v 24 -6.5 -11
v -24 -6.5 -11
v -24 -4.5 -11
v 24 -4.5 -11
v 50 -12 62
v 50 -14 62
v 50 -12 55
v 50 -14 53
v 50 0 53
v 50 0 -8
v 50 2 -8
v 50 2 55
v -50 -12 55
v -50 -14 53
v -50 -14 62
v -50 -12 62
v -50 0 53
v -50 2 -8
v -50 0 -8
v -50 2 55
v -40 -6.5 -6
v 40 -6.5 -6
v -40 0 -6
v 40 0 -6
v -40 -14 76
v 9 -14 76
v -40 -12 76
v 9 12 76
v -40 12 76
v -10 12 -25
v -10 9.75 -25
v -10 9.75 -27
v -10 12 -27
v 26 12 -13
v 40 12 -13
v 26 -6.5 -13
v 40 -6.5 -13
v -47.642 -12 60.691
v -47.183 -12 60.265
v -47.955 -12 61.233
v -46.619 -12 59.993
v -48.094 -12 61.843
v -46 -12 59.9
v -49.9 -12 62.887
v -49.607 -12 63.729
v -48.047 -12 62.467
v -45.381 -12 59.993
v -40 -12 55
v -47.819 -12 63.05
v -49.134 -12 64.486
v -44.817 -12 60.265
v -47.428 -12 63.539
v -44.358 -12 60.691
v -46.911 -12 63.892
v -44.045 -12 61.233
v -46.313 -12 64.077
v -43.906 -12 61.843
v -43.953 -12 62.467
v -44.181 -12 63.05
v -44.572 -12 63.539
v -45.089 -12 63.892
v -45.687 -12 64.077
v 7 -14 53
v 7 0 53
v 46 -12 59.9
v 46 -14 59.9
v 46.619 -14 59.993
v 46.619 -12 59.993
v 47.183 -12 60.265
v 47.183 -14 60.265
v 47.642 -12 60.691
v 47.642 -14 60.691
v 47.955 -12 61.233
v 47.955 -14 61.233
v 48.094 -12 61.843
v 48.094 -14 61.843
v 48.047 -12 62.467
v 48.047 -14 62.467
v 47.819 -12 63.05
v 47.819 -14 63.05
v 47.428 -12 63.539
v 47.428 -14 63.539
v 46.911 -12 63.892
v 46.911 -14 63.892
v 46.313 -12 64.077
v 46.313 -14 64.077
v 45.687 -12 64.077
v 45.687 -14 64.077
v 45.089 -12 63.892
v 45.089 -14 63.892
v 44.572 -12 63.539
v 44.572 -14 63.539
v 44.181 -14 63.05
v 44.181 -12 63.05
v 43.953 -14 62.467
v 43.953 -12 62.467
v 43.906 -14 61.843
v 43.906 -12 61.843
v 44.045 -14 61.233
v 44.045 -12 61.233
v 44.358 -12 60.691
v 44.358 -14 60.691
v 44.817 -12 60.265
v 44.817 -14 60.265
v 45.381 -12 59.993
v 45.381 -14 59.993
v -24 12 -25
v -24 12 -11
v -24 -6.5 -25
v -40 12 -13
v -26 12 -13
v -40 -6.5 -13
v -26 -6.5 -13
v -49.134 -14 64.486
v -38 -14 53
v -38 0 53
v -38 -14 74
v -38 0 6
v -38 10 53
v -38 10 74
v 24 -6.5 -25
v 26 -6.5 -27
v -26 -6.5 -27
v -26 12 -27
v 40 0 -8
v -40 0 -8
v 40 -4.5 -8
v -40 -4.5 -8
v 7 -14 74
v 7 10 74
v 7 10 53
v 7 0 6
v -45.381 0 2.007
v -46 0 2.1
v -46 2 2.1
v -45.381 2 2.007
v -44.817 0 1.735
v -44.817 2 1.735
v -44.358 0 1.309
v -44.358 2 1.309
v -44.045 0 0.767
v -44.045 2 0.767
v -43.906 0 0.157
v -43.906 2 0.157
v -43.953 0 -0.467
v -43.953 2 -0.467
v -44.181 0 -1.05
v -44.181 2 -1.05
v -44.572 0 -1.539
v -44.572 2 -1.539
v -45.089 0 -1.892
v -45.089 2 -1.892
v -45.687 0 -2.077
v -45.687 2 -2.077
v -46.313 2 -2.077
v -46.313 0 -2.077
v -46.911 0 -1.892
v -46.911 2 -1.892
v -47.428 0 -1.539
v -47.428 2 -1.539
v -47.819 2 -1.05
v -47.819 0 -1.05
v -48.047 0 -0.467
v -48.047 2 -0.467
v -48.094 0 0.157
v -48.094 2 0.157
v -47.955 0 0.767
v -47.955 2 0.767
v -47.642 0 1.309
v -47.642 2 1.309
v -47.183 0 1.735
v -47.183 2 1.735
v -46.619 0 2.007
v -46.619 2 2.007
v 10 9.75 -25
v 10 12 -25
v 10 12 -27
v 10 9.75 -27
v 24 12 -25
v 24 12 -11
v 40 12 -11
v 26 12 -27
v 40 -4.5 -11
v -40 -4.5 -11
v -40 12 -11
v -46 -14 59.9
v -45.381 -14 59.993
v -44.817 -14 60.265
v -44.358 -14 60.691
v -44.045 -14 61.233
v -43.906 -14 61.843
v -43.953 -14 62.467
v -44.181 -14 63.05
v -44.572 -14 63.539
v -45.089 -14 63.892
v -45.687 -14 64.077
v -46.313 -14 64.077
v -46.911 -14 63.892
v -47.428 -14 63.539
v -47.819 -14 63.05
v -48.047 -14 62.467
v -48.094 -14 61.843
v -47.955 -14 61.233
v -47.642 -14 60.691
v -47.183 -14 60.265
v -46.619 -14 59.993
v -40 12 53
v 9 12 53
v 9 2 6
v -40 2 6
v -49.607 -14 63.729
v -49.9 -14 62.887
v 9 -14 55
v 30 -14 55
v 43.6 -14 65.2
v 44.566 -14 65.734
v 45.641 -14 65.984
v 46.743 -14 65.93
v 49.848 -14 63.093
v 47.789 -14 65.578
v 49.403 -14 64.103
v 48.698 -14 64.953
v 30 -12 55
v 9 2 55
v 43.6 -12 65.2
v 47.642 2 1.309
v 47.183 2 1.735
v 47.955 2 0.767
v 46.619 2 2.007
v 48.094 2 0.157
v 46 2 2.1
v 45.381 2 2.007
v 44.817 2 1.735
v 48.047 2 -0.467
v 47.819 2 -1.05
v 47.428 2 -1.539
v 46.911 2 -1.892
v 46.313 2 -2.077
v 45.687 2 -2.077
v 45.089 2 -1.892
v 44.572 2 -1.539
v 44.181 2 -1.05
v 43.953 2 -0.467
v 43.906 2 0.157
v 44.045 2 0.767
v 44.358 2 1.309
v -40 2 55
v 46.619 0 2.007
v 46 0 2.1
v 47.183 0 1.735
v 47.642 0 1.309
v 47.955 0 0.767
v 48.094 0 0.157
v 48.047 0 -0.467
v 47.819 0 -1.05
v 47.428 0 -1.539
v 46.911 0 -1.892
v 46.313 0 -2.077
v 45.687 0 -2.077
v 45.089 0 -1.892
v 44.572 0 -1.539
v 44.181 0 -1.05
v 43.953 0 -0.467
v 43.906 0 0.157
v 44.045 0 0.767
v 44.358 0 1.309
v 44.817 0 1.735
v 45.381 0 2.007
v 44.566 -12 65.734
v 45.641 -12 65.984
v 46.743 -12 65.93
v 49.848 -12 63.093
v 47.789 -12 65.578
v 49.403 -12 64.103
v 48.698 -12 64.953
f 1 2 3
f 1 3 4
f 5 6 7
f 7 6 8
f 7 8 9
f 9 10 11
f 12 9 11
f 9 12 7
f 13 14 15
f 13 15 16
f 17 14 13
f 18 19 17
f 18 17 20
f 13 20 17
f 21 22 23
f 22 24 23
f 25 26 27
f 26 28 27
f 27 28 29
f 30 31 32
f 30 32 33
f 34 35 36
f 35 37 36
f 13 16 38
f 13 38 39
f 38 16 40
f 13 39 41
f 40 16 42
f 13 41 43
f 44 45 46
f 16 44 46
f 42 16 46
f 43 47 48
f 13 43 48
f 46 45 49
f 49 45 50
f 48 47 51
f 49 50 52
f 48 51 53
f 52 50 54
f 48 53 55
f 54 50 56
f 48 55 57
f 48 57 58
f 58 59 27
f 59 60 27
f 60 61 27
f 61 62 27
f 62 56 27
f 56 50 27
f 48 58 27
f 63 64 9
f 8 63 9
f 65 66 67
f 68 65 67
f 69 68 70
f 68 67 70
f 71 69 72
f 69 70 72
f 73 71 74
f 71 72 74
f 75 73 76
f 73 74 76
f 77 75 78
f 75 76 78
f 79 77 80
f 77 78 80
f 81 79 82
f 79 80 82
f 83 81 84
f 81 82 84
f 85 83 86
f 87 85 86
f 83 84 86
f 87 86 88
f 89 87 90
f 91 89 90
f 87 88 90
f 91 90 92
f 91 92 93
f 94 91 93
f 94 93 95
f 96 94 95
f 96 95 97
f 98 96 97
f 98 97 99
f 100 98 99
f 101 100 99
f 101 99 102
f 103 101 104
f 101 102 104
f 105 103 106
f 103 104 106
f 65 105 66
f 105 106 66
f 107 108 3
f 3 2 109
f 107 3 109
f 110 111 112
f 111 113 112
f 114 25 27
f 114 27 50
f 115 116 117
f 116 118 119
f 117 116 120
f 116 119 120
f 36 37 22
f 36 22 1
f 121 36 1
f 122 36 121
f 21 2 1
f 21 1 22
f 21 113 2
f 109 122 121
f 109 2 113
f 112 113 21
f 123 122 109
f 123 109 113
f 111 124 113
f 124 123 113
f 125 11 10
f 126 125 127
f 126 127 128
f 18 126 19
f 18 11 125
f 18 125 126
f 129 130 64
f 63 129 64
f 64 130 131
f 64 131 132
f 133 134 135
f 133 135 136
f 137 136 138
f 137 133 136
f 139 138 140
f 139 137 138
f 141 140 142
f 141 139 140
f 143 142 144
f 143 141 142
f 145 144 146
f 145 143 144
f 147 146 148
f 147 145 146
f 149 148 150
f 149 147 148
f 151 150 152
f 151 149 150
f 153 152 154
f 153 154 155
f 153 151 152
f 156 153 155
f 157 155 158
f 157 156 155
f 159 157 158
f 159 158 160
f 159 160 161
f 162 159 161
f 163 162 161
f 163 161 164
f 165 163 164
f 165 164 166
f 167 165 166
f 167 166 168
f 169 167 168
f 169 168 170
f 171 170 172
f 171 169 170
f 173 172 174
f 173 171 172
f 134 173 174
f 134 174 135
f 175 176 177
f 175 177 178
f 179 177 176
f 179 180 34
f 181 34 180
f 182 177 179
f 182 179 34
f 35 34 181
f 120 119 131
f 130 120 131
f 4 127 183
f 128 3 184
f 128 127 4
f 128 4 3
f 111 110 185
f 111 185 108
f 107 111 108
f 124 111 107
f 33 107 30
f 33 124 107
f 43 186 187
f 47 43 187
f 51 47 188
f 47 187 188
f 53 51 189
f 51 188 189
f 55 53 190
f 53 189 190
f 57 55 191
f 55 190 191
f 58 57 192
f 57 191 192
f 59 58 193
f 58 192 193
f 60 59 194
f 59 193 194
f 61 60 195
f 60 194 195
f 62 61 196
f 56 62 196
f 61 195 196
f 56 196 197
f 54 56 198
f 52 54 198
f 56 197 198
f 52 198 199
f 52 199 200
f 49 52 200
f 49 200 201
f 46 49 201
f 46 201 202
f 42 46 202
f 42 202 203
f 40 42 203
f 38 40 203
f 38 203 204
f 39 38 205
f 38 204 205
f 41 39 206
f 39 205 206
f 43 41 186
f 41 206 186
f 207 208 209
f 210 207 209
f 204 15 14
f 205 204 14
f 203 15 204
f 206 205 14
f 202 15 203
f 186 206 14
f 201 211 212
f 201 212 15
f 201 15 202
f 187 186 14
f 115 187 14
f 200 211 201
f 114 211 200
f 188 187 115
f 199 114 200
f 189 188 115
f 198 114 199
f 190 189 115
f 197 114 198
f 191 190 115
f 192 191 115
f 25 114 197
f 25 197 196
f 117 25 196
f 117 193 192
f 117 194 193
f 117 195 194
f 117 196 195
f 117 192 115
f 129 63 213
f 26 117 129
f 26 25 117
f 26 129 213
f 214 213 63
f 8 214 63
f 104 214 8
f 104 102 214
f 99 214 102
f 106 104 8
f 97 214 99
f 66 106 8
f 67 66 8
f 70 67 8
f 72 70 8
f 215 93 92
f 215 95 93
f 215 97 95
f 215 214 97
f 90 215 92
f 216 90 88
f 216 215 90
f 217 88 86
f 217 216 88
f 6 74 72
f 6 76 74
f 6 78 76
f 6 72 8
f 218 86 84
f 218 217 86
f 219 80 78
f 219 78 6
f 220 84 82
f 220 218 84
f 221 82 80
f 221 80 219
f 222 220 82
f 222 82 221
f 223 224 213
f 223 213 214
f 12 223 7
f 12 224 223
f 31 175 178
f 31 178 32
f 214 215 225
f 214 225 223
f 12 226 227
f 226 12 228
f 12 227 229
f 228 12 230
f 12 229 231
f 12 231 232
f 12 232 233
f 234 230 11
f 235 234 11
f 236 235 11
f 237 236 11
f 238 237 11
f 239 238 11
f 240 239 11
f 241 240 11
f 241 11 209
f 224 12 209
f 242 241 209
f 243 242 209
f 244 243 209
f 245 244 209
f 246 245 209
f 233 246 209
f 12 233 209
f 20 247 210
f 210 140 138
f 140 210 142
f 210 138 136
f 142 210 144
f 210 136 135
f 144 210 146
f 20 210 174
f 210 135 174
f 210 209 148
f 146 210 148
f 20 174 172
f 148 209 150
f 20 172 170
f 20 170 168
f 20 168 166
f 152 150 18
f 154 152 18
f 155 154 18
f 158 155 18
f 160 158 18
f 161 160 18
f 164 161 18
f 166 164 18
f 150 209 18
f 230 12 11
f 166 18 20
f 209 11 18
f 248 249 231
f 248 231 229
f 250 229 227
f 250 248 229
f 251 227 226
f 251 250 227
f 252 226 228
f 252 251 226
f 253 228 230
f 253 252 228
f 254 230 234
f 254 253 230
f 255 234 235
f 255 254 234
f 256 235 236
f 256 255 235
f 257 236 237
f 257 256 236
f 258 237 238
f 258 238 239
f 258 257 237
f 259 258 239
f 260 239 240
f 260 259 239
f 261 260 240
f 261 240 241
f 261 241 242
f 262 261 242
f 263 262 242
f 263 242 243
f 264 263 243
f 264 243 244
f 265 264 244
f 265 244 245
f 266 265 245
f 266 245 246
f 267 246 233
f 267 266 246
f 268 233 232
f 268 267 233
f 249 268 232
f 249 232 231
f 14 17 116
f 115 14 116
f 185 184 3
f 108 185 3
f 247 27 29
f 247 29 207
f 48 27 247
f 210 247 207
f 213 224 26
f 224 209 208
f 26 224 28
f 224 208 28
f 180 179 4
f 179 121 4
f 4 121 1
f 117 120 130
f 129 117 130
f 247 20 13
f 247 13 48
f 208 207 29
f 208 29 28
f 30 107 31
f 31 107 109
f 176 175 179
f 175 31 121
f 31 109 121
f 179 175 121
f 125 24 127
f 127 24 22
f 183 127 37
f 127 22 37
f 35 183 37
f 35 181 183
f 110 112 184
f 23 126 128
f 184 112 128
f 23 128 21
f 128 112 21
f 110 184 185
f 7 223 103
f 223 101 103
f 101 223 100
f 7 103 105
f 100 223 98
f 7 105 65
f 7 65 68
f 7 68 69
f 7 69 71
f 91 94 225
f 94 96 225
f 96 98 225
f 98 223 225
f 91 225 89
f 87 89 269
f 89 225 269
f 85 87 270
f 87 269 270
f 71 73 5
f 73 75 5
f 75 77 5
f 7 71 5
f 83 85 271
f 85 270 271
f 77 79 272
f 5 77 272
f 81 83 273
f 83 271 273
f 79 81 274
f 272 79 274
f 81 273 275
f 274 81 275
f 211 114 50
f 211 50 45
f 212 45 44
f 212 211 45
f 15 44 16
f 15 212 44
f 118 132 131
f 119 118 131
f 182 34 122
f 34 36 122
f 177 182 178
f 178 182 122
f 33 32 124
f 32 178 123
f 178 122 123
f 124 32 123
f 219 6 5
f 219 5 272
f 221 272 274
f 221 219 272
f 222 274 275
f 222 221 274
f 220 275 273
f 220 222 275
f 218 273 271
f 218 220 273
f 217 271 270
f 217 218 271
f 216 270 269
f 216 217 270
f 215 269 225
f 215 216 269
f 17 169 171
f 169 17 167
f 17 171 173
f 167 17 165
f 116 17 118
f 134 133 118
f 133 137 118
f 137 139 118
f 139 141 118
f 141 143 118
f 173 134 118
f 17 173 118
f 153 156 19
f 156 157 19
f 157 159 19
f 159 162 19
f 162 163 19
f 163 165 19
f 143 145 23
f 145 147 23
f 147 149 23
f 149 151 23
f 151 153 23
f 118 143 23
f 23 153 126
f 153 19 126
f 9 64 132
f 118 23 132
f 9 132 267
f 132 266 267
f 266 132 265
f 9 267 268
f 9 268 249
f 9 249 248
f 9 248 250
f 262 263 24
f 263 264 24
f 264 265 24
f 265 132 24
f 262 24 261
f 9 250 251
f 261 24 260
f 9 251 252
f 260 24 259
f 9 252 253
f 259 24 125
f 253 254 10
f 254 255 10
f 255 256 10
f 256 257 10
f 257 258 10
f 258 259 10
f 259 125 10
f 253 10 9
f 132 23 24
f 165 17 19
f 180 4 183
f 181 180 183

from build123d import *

# Parameters (mm, degrees)
CROQUIS1_R                 = 2.1
SALIENTE_EXTRUIR1_DEPTH    = 2
CROQUIS4_W                 = 49
CROQUIS4_H                 = 23
SALIENTE_EXTRUIR3_DEPTH    = 2
SALIENTE_EXTRUIR4_DEPTH    = 24
CROQUIS7_W                 = 10
CROQUIS7_H                 = 16
CROQUIS7_W_2               = 41
SALIENTE_EXTRUIR5_DEPTH    = 2
CROQUIS8_R                 = 2.1
SALIENTE_EXTRUIR6_DEPTH    = 2
CROQUIS9_W                 = 41
CROQUIS9_H                 = 2
CROQUIS9_W_2               = 10
SALIENTE_EXTRUIR7_DEPTH    = 12
SALIENTE_EXTRUIR8_REACH    = 99.227
SALIENTE_EXTRUIR9_DEPTH    = 2
SALIENTE_EXTRUIR10_DEPTH   = 2
CROQUIS15_W                = 80
CROQUIS15_H                = 8.5
SALIENTE_EXTRUIR11_DEPTH   = 2
CROQUIS16_W                = 48
CROQUIS16_H                = 14
SALIENTE_EXTRUIR12_DEPTH   = 2
SALIENTE_EXTRUIR13_DEPTH   = 16.5
CORTAR_EXTRUIR1_DEPTH      = 116.347301659
CORTAR_EXTRUIR1_DEPTH_BACK = 6


with BuildPart() as part:
    # Croquis1 → Saliente-Extruir1 (new body)
    with BuildSketch(Plane(origin=(0, 0, 0), x_dir=(1, 0, 0), z_dir=(0, 1, 0))):
        Polygon((50, 8), (50, -41), (9, -41), (9, -6), (-40, -6), (-40, -41), (-50, -41), (-50, 8), align=None)
        with Locations(Location((46, 0, 0), (0, 0, 270))):
            Circle(CROQUIS1_R, mode=Mode.SUBTRACT)
        with Locations(Location((-46, 0, 0), (0, 0, 270))):
            Circle(CROQUIS1_R, mode=Mode.SUBTRACT)
    extrude(amount=SALIENTE_EXTRUIR1_DEPTH)



with BuildPart() as body_2:
    # Croquis4 → Saliente-Extruir3 (new body)
    with BuildSketch(Plane(origin=(0, 12, 0), x_dir=(1, 0, 0), z_dir=(0, 1, 0))):
        with Locations((-15.5, -64.5)):
            Rectangle(CROQUIS4_W, CROQUIS4_H)
    extrude(amount=-SALIENTE_EXTRUIR3_DEPTH)

    # Croquis6 → Saliente-Extruir4 (add)
    with BuildSketch(Plane.XZ.offset(-10)):
        Polygon((-38, 74), (7, 74), (7, 53), (9, 53), (9, 76), (-40, 76), (-40, 53), (-38, 53), align=None)
    extrude(amount=SALIENTE_EXTRUIR4_DEPTH)

    # Croquis7 → Saliente-Extruir5 (add)
    with BuildSketch(Plane.XY.offset(53)):
        with Locations((-45, -6)):
            Rectangle(CROQUIS7_W, CROQUIS7_H)
        with Locations((29.5, -6)):
            Rectangle(CROQUIS7_W_2, CROQUIS7_H)
    extrude(amount=SALIENTE_EXTRUIR5_DEPTH)

    # Croquis8 → Saliente-Extruir6 (add)
    # profile 1 of 2: a face of its own
    with BuildSketch(Plane.XZ.offset(14)):
        with BuildLine():
            Line((30, 55), (50, 55))
            Line((50, 55), (50, 62))
            ThreePointArc((50, 62), (47.788854382, 65.577708764), (43.6, 65.2))
            Line((43.6, 65.2), (30, 55))
        make_face()
        with Locations(Location((46, 62, 0), (0, 0, 270))):
            Circle(CROQUIS8_R, mode=Mode.SUBTRACT)
    # profile 2 of 2: a face of its own
    with BuildSketch(Plane.XZ.offset(14)):
        with BuildLine():
            Line((-40, 55), (-40, 76))
            Line((-40, 76), (-49.133743765, 64.485890185))
            ThreePointArc((-49.133743765, 64.485890185), (-49.777232787, 63.316249395), (-50, 62))
            Line((-50, 62), (-50, 55))
            Line((-50, 55), (-40, 55))
        make_face()
        with Locations(Location((-46, 62, 0), (0, 0, 270))):
            Circle(CROQUIS8_R, mode=Mode.SUBTRACT)
    extrude(amount=-SALIENTE_EXTRUIR6_DEPTH)


with BuildPart() as part_1:
    add(part.part)

    add(body_2.part)  # Saliente-Extruir7 merges body 2
    # Croquis9 → Saliente-Extruir7 (add)
    with BuildSketch(Plane.XY.offset(41)):
        with Locations((29.5, 1)):
            Rectangle(CROQUIS9_W, CROQUIS9_H)
        with Locations((-45, 1)):
            Rectangle(CROQUIS9_W_2, CROQUIS9_H)
    extrude(amount=SALIENTE_EXTRUIR7_DEPTH)

    # Saliente-Extruir8: up to this face of the body (flat: up to its plane)
    saliente_extruir8_end = Plane(part_1.part.faces().sort_by_distance((-40, 0.267175573, 65.061068702))[0])
    # Croquis12 → Saliente-Extruir8 (add, up to the picked face)
    with BuildSketch(Plane.ZY.offset(-9), mode=Mode.PRIVATE) as saliente_extruir8_sk1:
        Polygon((53, 10), (53, 12), (6, 2), (6, 0), align=None)
    saliente_extruir8_tool1 = split(extrude(saliente_extruir8_sk1.sketch, amount=SALIENTE_EXTRUIR8_REACH, mode=Mode.PRIVATE), bisect_by=saliente_extruir8_end, keep=Keep.BOTH, mode=Mode.PRIVATE)
    add(saliente_extruir8_tool1.solids().sort_by(Axis((9, 6, 29.5), (-1, 0, 0)))[0])

    # Croquis13 → Saliente-Extruir9 (add)
    with BuildSketch(Plane(origin=(9, 0, 0), x_dir=(0, 0, -1), z_dir=(1, 0, 0))):
        Polygon((-53, 12), (-53, 0), (-6, 0), (-6, 2), align=None)
    extrude(amount=-SALIENTE_EXTRUIR9_DEPTH)

    # Croquis14 → Saliente-Extruir10 (add)
    with BuildSketch(Plane(origin=(-40, 0, 0), x_dir=(0, 0, -1), z_dir=(1, 0, 0))):
        Polygon((-6, 0), (-6, 2), (-53, 10), (-53, 0), align=None)
    extrude(amount=SALIENTE_EXTRUIR10_DEPTH)

    # Croquis15 → Saliente-Extruir11 (add)
    with BuildSketch(Plane(origin=(0, 0, -8), x_dir=(-1, 0, 0), z_dir=(0, 0, -1))):
        with Locations((0, -2.25)):
            Rectangle(CROQUIS15_W, CROQUIS15_H)
    extrude(amount=-SALIENTE_EXTRUIR11_DEPTH)

    # Croquis16 → Saliente-Extruir12 (add)
    with BuildSketch(Plane.XZ.offset(6.5)):
        Polygon((40, -6), (40, -13), (26, -13), (26, -27), (-26, -27), (-26, -13), (-40, -13), (-40, -6), align=None)
        with Locations((0, -18)):
            Rectangle(CROQUIS16_W, CROQUIS16_H, mode=Mode.SUBTRACT)
    extrude(amount=-SALIENTE_EXTRUIR12_DEPTH)

    # Croquis17 → Saliente-Extruir13 (add)
    with BuildSketch(Plane(origin=(0, -4.5, 0), x_dir=(1, 0, 0), z_dir=(0, 1, 0))):
        Polygon((-24, 25), (24, 25), (24, 11), (38.139050544, 11), (40, 11), (40, 13), (26, 13), (26, 27), (-26, 27), (-26, 13), (-40, 13), (-40, 11), (-38.139050544, 11), (-24, 11), align=None)
    extrude(amount=SALIENTE_EXTRUIR13_DEPTH)

    # Croquis18 → Cortar-Extruir1 (cut, two sides: drawn at the far end of the back side and taken through both)
    with BuildSketch(Plane(origin=(0, 0, -27), x_dir=(-1, 0, 0), z_dir=(0, 0, -1)).offset(-CORTAR_EXTRUIR1_DEPTH_BACK)):
        Polygon((-10, 152.782261794), (-10, 12), (-10, 9.75), (10, 9.75), (10, 12), (10, 152.782261794), (10, 434.346785383), (-10, 434.346785383), align=None)
    extrude(amount=CORTAR_EXTRUIR1_DEPTH + CORTAR_EXTRUIR1_DEPTH_BACK, mode=Mode.SUBTRACT)


solid = part_1.part
